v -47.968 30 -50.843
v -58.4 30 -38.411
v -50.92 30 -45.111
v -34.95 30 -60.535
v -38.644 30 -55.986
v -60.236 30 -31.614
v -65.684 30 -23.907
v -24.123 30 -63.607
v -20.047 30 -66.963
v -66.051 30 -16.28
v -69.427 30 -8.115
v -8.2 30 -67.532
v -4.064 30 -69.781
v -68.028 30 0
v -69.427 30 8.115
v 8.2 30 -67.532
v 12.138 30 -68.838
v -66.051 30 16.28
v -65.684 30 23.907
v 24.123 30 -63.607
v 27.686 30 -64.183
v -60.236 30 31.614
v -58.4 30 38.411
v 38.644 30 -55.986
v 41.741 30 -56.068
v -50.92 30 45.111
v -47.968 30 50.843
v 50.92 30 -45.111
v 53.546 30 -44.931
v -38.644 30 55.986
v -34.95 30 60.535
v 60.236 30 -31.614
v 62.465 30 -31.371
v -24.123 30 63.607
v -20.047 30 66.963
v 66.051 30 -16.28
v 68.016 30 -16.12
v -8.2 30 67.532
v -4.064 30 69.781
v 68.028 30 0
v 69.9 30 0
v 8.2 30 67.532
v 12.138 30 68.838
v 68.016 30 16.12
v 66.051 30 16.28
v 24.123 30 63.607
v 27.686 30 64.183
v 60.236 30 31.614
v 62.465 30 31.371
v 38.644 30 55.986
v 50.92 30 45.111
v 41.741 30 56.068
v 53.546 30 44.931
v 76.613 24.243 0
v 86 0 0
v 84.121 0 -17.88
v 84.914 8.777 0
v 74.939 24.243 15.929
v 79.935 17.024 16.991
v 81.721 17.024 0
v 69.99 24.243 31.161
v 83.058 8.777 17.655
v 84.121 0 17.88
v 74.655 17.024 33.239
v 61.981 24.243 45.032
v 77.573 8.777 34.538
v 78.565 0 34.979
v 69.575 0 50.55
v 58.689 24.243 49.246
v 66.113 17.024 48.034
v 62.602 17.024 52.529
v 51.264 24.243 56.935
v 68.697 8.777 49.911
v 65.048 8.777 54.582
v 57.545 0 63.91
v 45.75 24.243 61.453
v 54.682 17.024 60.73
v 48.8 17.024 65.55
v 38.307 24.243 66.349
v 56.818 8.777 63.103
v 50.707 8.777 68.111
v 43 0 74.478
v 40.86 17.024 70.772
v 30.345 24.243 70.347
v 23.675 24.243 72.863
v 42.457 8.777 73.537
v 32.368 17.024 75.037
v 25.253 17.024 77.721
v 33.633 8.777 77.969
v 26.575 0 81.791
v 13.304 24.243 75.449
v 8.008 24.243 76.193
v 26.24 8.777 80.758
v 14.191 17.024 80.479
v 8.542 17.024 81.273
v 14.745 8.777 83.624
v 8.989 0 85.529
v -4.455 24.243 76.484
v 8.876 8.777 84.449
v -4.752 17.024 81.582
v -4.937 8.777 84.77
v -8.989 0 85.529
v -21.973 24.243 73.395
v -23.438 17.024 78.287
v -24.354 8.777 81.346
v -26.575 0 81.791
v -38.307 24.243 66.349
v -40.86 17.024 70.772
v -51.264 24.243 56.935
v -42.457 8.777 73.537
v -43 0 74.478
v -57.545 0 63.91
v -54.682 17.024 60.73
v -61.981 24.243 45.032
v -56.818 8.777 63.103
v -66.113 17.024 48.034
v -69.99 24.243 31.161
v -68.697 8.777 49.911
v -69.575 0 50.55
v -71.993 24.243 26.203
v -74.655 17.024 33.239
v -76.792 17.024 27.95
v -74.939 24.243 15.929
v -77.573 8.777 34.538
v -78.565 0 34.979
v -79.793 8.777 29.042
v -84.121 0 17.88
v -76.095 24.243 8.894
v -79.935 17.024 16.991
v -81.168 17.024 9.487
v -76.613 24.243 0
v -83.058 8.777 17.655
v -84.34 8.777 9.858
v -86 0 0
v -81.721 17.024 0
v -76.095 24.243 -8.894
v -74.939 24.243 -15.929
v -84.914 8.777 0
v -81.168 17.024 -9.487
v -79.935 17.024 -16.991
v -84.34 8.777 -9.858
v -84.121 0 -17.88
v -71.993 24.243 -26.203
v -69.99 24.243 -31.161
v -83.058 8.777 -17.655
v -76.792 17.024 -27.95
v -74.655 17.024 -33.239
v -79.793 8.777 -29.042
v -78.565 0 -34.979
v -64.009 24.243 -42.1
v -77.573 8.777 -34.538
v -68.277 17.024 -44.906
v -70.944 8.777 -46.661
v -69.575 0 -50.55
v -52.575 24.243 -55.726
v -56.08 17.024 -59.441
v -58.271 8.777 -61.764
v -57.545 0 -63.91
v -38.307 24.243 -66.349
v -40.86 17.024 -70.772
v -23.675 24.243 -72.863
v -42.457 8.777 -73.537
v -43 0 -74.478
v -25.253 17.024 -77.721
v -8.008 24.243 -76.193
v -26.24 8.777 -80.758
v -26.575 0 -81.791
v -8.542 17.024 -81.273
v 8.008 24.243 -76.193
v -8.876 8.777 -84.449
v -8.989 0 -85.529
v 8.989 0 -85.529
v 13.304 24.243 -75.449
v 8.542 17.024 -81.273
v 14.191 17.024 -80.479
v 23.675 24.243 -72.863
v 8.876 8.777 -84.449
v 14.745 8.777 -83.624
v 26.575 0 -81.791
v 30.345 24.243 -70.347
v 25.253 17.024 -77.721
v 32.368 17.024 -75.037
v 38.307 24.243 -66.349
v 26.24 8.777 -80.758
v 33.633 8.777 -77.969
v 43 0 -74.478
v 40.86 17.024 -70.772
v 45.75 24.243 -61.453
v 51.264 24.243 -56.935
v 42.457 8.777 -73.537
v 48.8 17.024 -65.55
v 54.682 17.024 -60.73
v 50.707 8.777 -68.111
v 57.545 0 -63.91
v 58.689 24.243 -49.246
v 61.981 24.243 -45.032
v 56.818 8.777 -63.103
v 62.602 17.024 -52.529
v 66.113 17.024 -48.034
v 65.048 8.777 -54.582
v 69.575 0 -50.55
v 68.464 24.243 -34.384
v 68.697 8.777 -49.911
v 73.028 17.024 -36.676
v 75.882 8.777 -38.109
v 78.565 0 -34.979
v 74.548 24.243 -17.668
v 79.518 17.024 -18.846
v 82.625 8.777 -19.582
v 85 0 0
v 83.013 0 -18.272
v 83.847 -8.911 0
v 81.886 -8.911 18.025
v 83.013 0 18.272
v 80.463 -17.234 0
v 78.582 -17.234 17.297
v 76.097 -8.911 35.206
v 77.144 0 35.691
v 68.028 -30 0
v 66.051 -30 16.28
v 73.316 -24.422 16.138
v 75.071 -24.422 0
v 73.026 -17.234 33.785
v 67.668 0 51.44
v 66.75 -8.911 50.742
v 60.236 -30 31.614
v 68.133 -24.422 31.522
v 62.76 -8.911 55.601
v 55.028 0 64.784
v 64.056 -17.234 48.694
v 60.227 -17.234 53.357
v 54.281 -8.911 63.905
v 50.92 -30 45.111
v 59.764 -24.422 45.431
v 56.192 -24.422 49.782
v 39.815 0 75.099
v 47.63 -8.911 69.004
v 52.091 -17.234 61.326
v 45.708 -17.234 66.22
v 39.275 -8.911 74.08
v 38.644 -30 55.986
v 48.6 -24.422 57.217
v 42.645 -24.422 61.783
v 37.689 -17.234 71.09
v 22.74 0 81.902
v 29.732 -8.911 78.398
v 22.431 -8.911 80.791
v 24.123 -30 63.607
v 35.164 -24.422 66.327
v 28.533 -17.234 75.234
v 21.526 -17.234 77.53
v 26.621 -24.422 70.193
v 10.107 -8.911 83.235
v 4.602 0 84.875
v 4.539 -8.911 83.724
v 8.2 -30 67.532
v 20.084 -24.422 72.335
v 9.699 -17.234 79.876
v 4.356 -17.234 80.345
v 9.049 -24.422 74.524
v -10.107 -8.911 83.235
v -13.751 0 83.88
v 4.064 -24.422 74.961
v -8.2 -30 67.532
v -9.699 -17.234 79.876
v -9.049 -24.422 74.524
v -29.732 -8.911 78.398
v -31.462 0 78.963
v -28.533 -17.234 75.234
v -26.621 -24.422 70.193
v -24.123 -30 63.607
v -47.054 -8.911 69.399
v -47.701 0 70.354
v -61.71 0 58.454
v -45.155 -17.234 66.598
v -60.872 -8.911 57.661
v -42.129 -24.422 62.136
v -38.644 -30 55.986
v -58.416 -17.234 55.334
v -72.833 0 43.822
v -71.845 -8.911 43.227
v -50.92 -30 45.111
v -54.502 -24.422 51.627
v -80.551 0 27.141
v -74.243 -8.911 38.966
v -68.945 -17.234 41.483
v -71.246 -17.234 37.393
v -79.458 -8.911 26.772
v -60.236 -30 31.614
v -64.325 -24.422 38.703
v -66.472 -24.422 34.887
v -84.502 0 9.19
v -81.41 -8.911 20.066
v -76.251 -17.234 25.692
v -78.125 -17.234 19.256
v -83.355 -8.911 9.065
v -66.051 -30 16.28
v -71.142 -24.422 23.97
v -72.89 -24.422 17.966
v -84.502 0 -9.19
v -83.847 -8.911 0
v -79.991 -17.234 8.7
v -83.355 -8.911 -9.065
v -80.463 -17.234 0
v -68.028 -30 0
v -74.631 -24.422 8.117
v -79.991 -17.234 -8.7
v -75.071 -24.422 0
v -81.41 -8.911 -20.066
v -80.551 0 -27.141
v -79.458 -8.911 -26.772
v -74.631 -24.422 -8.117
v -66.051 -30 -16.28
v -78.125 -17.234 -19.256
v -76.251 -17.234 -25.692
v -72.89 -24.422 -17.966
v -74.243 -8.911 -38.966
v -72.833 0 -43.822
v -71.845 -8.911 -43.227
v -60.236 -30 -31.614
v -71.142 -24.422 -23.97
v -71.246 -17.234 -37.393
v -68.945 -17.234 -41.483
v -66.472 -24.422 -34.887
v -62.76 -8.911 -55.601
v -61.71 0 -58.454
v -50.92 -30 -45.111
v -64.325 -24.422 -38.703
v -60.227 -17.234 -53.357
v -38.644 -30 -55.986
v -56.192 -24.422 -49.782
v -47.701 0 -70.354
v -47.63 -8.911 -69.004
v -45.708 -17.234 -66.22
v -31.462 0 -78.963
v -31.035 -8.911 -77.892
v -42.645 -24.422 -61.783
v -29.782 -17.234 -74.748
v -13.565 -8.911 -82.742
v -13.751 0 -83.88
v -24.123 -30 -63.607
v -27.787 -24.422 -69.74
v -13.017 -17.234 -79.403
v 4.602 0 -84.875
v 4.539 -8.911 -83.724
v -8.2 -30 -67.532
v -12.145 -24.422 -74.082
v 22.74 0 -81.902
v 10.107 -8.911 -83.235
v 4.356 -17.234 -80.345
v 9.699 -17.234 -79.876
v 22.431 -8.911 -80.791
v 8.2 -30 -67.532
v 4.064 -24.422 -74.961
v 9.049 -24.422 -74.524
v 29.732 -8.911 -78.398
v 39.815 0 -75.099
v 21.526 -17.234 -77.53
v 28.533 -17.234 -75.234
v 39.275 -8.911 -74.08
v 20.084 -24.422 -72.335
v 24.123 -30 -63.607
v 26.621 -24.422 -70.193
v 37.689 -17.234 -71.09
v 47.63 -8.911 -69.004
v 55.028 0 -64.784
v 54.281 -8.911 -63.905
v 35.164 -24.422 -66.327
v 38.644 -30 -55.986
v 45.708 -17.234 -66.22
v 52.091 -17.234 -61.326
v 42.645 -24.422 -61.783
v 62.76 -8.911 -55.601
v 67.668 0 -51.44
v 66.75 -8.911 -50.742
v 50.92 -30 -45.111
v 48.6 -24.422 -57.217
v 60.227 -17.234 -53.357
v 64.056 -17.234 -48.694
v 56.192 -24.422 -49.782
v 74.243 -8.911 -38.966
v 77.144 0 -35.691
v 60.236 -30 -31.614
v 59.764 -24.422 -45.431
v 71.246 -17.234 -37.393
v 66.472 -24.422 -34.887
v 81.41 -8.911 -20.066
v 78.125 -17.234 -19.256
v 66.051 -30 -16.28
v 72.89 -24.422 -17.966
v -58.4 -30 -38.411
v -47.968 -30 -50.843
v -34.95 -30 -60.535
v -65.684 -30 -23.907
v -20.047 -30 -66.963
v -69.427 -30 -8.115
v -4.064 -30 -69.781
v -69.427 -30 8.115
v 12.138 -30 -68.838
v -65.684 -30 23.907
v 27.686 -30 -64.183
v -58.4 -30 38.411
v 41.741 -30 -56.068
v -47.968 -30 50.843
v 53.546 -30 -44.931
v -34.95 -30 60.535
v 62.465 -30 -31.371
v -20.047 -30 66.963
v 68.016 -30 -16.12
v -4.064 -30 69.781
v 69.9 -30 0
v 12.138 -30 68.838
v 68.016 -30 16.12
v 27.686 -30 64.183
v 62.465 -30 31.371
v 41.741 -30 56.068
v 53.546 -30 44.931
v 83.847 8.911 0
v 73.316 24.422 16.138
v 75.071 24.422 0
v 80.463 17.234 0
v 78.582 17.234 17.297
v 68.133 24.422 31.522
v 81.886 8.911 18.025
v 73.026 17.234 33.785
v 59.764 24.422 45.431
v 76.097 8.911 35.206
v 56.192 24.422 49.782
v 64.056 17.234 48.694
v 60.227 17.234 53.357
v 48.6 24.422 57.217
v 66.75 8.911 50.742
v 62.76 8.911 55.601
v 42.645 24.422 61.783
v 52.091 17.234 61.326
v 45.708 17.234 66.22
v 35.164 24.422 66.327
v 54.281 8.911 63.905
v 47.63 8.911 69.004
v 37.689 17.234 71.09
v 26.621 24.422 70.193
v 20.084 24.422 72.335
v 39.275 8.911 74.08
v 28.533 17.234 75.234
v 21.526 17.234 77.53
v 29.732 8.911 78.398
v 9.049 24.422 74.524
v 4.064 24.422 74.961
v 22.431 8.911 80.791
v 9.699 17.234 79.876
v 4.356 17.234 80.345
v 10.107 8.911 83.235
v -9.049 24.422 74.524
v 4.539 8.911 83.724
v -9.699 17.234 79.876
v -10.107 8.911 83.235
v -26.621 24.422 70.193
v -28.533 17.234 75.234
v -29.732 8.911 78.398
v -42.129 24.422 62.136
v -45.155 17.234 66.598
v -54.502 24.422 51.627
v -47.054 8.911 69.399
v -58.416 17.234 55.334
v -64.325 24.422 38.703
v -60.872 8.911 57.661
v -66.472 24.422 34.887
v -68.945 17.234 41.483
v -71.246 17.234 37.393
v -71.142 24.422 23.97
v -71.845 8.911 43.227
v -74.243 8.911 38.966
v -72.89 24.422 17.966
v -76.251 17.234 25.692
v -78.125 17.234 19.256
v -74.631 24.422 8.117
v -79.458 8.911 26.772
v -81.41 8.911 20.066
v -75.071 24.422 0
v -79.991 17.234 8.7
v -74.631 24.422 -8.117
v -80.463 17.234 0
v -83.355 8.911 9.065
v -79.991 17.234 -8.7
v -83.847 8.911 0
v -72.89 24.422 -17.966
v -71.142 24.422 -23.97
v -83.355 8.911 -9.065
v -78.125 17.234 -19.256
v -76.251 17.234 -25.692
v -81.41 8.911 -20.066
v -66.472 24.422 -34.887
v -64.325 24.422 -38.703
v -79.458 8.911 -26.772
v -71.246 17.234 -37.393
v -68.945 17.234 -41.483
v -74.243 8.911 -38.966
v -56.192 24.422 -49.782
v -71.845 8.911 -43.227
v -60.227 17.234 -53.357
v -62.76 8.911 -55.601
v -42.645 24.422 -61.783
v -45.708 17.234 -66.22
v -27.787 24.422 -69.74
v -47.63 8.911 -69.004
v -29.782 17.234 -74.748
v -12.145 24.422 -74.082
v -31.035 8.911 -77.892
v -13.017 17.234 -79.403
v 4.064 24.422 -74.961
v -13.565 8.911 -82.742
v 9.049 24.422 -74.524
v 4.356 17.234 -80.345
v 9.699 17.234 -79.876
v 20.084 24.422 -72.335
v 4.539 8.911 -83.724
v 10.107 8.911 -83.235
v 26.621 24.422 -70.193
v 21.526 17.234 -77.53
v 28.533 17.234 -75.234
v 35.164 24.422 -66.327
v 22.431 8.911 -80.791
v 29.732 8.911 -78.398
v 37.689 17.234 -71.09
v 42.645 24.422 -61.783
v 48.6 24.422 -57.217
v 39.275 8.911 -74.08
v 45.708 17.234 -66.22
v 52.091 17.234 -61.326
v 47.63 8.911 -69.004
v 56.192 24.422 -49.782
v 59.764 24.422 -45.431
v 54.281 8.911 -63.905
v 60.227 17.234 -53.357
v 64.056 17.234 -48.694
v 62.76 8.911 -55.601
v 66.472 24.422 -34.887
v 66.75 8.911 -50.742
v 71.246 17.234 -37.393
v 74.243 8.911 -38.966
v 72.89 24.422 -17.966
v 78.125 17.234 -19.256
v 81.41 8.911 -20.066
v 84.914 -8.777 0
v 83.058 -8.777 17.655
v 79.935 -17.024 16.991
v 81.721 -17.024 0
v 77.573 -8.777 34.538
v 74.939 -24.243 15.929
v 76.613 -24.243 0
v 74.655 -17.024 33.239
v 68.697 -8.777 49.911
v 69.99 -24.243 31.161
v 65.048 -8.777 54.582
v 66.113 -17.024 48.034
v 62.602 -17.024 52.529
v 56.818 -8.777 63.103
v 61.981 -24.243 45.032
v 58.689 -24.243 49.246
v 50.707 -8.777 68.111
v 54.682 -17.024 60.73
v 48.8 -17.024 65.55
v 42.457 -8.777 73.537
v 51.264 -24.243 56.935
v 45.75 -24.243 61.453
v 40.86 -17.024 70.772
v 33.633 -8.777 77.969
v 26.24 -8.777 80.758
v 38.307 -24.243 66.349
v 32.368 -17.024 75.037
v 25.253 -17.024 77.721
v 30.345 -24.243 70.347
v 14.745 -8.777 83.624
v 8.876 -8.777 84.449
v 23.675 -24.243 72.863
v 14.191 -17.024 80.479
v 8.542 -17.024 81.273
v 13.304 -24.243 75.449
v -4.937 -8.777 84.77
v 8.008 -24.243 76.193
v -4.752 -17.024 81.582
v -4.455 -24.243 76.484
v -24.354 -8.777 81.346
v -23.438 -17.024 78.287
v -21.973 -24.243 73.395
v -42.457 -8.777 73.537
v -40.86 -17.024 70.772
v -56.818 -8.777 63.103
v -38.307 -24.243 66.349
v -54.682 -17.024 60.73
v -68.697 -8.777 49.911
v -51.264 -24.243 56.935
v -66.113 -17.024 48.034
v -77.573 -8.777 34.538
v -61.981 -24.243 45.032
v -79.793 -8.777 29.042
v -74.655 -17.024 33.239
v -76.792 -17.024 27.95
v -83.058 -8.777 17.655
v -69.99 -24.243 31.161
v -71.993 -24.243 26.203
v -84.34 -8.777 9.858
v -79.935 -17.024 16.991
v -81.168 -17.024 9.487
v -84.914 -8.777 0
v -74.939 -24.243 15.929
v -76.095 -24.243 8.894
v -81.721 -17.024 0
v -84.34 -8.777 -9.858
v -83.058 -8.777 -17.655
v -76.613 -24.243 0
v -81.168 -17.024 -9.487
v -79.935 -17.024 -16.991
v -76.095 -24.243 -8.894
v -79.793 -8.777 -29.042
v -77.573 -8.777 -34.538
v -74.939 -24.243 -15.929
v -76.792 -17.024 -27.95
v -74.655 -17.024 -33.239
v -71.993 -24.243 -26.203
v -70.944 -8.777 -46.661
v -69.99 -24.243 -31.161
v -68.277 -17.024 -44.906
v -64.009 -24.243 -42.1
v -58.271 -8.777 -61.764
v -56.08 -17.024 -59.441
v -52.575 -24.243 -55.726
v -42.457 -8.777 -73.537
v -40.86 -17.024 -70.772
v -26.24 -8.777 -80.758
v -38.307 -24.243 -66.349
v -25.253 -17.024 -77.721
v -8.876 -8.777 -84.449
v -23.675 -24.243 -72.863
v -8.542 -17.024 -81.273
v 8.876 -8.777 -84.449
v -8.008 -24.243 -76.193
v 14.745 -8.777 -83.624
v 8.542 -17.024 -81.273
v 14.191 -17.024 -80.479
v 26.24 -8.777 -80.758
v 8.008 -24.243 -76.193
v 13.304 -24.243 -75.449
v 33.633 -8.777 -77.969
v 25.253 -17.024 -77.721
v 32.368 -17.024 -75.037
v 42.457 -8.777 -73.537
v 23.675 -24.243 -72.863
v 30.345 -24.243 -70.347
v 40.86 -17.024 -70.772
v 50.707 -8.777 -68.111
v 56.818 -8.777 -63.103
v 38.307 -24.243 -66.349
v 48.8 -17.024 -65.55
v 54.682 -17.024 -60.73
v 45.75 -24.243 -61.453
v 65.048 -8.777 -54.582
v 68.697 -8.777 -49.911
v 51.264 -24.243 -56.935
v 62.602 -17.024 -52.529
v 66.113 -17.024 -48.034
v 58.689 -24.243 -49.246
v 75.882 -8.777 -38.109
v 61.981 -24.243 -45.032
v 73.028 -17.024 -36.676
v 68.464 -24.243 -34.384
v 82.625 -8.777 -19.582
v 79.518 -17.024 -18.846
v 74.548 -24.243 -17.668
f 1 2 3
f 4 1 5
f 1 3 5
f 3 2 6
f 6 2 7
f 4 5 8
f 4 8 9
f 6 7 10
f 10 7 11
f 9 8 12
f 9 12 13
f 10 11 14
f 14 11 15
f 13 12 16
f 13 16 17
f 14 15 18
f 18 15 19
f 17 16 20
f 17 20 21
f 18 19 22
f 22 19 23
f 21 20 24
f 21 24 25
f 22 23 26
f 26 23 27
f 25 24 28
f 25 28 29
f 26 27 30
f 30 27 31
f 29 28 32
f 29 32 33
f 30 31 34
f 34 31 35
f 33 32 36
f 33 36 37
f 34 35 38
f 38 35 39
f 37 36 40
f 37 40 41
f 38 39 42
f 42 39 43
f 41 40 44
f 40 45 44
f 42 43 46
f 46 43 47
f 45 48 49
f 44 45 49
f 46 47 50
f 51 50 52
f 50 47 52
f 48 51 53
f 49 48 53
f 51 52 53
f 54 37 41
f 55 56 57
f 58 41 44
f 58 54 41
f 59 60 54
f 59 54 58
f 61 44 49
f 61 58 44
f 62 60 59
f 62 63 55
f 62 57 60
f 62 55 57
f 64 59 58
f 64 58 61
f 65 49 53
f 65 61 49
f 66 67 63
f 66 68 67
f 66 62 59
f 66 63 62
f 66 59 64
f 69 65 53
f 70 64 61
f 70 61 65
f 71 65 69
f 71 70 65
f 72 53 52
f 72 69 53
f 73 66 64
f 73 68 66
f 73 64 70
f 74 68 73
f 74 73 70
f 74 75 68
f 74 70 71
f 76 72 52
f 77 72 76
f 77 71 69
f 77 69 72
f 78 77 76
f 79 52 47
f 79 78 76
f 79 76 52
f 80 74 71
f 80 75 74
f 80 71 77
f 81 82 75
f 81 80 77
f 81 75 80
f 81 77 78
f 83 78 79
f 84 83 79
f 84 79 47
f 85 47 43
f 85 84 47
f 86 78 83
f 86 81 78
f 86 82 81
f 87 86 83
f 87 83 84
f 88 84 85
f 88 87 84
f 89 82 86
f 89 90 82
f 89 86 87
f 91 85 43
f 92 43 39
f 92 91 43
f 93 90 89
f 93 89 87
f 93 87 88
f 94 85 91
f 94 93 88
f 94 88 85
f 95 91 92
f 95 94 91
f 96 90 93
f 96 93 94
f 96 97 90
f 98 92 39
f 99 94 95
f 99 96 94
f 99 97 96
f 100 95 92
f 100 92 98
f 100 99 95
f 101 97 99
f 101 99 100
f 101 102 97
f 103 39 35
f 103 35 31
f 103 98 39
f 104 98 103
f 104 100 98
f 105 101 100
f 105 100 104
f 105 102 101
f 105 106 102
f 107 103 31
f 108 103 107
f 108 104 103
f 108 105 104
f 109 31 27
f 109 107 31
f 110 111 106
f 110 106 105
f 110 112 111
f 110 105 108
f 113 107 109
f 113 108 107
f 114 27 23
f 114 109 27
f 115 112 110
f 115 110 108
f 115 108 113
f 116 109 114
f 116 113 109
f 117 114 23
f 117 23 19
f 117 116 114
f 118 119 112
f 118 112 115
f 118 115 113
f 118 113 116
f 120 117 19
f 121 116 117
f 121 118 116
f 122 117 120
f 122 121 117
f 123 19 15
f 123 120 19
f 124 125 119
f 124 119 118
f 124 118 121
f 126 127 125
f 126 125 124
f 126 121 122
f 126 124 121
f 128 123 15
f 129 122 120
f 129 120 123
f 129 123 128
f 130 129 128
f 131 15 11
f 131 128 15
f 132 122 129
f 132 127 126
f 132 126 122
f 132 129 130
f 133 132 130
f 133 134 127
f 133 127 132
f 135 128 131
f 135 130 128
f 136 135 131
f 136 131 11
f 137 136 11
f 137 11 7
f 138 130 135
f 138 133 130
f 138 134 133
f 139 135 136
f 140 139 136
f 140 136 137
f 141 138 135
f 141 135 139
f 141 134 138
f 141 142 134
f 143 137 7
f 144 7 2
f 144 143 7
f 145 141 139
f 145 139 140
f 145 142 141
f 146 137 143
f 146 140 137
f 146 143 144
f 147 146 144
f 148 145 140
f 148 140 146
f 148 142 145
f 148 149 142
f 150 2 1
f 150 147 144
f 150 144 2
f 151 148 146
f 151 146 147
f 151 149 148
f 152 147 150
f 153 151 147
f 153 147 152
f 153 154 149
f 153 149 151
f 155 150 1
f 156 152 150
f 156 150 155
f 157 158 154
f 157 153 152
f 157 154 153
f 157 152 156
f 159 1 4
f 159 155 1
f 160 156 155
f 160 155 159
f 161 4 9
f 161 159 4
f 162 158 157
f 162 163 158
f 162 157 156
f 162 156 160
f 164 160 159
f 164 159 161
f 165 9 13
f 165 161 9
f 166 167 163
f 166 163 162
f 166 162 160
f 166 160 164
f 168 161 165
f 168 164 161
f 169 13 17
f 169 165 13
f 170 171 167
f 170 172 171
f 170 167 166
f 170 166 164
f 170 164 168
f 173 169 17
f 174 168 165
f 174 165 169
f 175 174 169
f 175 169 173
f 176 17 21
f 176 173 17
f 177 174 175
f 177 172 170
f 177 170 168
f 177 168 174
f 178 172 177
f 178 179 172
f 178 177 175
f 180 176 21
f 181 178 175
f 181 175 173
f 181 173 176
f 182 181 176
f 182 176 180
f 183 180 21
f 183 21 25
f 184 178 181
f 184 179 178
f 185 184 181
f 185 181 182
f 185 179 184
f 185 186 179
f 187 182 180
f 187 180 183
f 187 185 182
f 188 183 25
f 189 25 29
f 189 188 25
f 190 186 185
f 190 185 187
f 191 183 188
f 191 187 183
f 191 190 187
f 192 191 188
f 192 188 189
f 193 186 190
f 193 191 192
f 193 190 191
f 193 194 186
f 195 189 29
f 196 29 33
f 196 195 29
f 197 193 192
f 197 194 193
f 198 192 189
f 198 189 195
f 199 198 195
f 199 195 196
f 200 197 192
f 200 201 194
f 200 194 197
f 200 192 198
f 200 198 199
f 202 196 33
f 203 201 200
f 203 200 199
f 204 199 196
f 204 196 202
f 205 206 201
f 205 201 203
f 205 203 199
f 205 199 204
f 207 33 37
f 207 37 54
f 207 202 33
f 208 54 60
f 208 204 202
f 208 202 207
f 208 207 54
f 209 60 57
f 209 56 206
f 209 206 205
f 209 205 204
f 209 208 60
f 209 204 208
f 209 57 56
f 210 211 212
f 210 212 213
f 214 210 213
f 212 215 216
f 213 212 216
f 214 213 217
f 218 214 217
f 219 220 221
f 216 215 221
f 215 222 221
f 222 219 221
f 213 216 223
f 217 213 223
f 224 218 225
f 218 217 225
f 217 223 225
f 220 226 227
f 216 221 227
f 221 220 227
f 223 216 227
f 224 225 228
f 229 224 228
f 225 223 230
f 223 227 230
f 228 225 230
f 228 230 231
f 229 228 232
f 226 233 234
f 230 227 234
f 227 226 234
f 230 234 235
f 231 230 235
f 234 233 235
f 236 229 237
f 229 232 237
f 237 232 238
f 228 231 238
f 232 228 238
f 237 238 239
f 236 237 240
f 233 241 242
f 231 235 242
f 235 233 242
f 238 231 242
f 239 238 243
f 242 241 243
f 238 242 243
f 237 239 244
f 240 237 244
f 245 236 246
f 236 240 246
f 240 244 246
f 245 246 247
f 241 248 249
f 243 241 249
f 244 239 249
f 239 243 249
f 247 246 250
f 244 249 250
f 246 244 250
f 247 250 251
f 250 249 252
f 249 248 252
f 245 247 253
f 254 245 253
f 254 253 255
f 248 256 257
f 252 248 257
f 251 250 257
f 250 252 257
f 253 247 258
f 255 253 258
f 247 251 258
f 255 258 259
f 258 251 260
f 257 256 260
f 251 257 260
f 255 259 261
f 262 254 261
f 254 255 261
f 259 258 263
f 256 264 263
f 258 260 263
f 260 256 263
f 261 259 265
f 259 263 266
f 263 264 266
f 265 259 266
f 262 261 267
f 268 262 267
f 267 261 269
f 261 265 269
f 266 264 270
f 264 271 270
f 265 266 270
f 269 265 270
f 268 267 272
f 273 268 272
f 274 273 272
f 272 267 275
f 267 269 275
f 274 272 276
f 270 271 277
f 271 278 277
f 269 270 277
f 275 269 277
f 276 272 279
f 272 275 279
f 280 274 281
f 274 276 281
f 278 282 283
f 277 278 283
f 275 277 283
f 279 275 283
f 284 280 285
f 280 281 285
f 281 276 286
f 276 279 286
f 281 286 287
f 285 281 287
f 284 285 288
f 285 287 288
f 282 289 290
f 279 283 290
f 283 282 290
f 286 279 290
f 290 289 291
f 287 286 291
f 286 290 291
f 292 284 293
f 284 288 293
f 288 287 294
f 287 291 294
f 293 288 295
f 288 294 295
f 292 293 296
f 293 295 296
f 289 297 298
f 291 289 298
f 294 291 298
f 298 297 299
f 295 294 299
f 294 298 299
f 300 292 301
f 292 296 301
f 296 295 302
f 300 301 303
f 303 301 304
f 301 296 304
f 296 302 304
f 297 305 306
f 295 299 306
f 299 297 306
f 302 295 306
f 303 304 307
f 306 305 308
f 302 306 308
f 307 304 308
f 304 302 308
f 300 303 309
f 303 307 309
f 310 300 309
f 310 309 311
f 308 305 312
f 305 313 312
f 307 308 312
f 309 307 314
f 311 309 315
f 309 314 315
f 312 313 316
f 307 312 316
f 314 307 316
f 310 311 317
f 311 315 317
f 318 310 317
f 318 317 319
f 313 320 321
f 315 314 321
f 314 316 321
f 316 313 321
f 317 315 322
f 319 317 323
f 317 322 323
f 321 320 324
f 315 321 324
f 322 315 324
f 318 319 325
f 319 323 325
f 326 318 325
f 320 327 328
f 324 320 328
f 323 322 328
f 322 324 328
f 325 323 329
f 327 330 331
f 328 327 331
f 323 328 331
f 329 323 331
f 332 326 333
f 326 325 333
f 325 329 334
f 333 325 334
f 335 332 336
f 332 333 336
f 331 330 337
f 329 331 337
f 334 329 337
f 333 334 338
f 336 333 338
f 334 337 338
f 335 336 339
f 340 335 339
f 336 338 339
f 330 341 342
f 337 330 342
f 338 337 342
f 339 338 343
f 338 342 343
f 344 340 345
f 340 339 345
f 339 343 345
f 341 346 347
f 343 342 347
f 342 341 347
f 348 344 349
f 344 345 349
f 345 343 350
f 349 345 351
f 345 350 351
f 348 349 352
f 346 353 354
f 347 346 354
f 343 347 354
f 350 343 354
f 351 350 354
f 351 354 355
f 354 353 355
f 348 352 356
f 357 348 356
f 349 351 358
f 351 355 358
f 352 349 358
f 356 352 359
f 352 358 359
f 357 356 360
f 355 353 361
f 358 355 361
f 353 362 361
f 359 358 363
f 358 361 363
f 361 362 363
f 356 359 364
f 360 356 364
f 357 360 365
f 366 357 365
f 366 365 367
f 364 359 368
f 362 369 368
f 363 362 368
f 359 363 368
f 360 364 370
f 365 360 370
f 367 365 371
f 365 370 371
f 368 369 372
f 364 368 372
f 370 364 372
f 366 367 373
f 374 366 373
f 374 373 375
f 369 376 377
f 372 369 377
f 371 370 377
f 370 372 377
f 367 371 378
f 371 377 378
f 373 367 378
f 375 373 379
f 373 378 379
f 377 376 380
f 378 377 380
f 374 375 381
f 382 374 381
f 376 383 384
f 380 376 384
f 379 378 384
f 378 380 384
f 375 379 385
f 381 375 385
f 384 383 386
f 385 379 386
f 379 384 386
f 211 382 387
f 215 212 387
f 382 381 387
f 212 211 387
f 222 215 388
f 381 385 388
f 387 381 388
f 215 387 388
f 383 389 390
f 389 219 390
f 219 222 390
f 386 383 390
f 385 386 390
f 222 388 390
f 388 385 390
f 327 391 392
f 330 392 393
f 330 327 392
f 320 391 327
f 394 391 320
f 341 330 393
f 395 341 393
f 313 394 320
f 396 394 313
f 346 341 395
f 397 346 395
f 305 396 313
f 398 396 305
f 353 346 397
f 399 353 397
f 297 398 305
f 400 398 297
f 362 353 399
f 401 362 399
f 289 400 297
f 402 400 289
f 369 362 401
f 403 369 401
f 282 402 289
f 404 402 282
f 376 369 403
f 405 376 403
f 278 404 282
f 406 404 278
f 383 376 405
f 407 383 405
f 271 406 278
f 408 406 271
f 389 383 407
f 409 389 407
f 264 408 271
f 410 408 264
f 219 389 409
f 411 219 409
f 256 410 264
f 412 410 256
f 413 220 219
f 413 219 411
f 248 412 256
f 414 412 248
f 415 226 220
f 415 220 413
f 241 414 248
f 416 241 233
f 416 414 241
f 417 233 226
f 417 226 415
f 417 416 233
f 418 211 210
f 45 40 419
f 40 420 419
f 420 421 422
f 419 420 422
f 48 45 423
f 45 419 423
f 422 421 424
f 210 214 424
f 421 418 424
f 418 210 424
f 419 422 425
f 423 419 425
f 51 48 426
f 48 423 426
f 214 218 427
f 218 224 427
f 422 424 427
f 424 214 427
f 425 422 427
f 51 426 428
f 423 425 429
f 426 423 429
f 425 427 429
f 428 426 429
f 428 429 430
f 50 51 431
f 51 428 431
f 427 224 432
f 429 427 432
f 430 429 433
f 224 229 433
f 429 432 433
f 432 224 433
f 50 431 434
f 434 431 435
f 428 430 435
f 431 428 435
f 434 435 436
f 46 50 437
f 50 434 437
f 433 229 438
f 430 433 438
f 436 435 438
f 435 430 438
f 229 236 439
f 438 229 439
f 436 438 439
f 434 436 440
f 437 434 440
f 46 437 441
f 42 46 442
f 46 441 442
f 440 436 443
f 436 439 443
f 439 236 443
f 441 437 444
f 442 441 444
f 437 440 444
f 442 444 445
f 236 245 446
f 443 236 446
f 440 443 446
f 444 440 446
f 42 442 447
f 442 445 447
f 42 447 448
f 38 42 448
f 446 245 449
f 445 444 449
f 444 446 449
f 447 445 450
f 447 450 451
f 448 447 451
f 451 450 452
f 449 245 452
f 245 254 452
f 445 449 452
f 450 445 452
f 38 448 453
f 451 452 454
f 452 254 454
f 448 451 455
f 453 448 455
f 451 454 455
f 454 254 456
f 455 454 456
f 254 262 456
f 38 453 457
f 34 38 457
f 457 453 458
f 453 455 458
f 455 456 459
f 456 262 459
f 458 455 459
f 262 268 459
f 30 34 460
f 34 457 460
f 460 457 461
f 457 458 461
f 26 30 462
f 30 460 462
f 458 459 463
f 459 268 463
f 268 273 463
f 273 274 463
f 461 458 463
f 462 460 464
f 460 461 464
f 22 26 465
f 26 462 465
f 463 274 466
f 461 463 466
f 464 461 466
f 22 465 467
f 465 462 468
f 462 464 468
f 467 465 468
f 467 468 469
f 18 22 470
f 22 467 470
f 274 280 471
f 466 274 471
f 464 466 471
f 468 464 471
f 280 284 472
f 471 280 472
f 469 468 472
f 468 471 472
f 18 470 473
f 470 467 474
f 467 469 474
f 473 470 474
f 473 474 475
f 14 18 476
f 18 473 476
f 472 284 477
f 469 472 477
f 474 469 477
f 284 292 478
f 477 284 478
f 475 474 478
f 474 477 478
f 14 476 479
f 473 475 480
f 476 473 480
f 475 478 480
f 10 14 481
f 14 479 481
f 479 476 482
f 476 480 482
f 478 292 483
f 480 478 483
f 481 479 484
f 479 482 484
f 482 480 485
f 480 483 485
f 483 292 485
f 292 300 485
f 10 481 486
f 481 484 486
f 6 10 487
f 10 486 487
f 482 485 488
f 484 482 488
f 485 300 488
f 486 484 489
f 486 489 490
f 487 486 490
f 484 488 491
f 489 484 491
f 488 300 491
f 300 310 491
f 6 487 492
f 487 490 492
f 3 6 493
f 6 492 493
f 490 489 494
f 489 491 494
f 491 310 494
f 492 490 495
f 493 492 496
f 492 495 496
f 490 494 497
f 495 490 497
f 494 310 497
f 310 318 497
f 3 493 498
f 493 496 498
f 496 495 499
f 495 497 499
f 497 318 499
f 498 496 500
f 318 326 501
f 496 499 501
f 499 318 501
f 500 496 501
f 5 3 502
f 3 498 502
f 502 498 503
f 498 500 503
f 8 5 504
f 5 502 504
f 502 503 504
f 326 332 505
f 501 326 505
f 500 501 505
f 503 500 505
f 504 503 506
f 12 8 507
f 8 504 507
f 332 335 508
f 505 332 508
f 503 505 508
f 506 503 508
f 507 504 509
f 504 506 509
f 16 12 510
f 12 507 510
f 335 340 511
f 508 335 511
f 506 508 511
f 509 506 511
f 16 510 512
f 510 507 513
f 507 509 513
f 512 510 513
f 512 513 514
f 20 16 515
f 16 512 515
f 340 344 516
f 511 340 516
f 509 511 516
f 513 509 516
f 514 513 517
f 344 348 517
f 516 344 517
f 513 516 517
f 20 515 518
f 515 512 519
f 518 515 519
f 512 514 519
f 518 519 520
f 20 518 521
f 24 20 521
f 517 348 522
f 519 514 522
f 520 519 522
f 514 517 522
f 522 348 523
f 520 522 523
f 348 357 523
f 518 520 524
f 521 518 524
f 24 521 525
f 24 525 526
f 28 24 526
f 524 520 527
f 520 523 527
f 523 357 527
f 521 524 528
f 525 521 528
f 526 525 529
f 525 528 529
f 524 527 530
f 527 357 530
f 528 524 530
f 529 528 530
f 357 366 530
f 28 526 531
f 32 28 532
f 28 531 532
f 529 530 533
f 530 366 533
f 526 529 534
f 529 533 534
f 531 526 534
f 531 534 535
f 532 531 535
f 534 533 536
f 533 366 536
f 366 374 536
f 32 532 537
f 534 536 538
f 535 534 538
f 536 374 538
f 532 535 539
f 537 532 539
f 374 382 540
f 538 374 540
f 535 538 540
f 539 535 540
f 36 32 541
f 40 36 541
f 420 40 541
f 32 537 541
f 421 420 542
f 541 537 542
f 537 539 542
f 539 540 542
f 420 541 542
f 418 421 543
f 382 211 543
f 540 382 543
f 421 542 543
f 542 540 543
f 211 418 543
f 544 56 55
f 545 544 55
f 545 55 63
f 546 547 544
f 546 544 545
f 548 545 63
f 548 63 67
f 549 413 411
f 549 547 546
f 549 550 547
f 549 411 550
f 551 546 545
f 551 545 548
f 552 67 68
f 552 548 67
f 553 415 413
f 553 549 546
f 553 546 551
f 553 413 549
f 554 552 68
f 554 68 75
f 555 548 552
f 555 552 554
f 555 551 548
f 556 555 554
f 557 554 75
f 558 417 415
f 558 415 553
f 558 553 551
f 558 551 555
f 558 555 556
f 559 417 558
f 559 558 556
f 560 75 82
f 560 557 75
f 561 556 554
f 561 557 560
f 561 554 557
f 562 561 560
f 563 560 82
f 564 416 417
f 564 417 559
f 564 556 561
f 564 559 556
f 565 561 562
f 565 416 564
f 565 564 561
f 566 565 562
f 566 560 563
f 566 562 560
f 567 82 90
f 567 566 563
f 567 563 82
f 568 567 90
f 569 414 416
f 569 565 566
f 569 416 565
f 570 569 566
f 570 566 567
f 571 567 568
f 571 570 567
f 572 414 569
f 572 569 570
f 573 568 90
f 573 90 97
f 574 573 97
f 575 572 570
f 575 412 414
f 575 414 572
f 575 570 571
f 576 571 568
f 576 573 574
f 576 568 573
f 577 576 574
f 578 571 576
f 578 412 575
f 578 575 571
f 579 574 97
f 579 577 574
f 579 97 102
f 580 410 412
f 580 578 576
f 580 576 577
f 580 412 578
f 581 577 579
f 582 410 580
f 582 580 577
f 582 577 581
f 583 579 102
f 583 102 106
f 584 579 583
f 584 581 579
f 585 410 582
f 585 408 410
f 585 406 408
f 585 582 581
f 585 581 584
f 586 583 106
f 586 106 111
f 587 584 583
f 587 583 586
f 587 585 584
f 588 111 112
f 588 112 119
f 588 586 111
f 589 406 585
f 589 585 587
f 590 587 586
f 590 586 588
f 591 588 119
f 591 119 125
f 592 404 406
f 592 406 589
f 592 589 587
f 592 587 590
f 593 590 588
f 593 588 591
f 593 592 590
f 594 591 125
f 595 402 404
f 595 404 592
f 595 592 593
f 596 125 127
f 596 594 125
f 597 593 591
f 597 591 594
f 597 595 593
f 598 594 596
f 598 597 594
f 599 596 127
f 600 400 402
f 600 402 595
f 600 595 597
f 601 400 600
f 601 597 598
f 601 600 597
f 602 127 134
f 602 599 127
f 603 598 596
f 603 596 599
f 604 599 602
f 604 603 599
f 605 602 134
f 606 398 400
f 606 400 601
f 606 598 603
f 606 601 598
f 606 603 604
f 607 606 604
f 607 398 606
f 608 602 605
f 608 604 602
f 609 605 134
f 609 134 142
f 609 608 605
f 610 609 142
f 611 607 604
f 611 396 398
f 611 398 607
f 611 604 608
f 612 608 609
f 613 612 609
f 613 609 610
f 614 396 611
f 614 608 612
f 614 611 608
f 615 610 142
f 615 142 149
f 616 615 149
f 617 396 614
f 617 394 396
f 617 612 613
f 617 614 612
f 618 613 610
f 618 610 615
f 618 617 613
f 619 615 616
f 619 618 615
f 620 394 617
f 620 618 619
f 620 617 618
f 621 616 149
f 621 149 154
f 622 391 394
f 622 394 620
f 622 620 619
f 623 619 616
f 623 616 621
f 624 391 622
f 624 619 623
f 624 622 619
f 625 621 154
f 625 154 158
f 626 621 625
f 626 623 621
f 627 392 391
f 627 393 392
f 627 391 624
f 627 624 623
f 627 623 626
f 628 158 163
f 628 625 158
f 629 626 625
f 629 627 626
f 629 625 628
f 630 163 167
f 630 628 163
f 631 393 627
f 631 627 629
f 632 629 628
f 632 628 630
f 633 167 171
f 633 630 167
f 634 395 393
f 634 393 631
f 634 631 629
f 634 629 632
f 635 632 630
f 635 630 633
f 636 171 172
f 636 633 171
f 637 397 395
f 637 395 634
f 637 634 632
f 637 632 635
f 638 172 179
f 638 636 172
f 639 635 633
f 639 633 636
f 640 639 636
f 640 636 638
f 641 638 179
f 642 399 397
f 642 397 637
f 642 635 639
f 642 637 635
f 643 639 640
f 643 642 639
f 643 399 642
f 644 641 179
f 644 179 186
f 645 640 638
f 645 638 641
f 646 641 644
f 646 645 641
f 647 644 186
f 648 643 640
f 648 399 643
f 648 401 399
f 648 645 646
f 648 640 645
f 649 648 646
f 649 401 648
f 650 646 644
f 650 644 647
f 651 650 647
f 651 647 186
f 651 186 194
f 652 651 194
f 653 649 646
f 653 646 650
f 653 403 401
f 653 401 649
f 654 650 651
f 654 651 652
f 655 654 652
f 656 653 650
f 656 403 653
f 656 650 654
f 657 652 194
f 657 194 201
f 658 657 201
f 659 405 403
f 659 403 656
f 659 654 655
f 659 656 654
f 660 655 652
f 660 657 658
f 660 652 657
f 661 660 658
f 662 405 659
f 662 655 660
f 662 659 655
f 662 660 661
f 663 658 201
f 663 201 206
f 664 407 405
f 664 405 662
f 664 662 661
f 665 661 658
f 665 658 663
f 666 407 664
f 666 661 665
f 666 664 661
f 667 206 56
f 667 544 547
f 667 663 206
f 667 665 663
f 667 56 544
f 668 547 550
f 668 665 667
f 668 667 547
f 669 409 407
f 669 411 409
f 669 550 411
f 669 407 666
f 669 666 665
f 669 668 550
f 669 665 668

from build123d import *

# Parameters (mm, degrees)
CYLINDER030_R          = 100
CYLINDER030_DEPTH      = 86
CYLINDER030_ROLL_ANGLE = 90
CYLINDER_R             = 50
CYLINDER_DEPTH         = 70
CYLINDER_ROLL_ANGLE    = 90
TORUS_R                = 35
TORUS_ROLL_ANGLE       = 90
CYLINDER029_R          = 60
CYLINDER029_DEPTH      = 86
CYLINDER029_ROLL_ANGLE = 90
TORUS001_R             = 36
TORUS001_ROLL_ANGLE    = 90


with BuildPart() as cilindro030:
    # Cylinder030 → Cylinder030 (new body)
    with BuildSketch(Plane.XY):
        Circle(CYLINDER030_R)
    extrude(amount=CYLINDER030_DEPTH)


with BuildPart() as cilindro030_1:
    # Cylinder030 roll: moved
    add(cilindro030.part.rotate(Axis((0, 0, 0), (1, 0, 0)), CYLINDER030_ROLL_ANGLE))


with BuildPart() as cilindro030_2:
    # Cylinder030 placement: moved
    add(cilindro030_1.part.moved(Location((0, -30, 0))))


with BuildPart() as fusion021:
    # Part__Mirroring005: instance of Cilindro030
    add(cilindro030_2.part.mirror(Plane(origin=(0, 0, 0), x_dir=(1, 0, 0), z_dir=(0, 1, 0))))

    # Fusion021: union Cilindro030
    add(cilindro030_2.part)


with BuildPart() as cilindro:
    # Cylinder → Cylinder (new body)
    with BuildSketch(Plane.XY):
        Circle(CYLINDER_R)
    extrude(amount=CYLINDER_DEPTH)


with BuildPart() as cilindro_1:
    # Cylinder roll: moved
    add(cilindro.part.rotate(Axis((0, 0, 0), (1, 0, 0)), CYLINDER_ROLL_ANGLE))


with BuildPart() as cilindro_2:
    # Cylinder placement: moved
    add(cilindro_1.part.moved(Location((0, 35, 0))))


with BuildPart() as clone_of_fusion:
    # Torus → Torus (revolve)
    with BuildSketch(Plane.XZ):
        with Locations((50, 0)):
            Circle(TORUS_R)
    revolve(axis=Axis((0, 0, 0), (0, 0, 1)))


with BuildPart() as clone_of_fusion_1:
    # Torus roll: moved
    add(clone_of_fusion.part.rotate(Axis((0, 0, 0), (1, 0, 0)), TORUS_ROLL_ANGLE))


with BuildPart() as clone_of_fusion_2:
    # Torus placement: moved
    add(clone_of_fusion_1.part)

    # Fusion: union Cilindro
    add(cilindro_2.part)


with BuildPart() as cilindro029:
    # Cylinder029 → Cylinder029 (new body)
    with BuildSketch(Plane.XY):
        Circle(CYLINDER029_R)
    extrude(amount=CYLINDER029_DEPTH)


with BuildPart() as cilindro029_1:
    # Cylinder029 roll: moved
    add(cilindro029.part.rotate(Axis((0, 0, 0), (1, 0, 0)), CYLINDER029_ROLL_ANGLE))


with BuildPart() as cilindro029_2:
    # Cylinder029 placement: moved
    add(cilindro029_1.part.moved(Location((0, 42, 0))))


with BuildPart() as cut030:
    # Torus001 → Torus001 (revolve)
    with BuildSketch(Plane.XZ):
        with Locations((50, 0)):
            Circle(TORUS001_R)
    revolve(axis=Axis((0, 0, 0), (0, 0, 1)))


with BuildPart() as cut030_1:
    # Torus001 roll: moved
    add(cut030.part.rotate(Axis((0, 0, 0), (1, 0, 0)), TORUS001_ROLL_ANGLE))


with BuildPart() as cut030_2:
    # Torus001 placement: moved
    add(cut030_1.part)

    # Cut028: cut Cilindro029
    add(cilindro029_2.part, mode=Mode.SUBTRACT)

    # Cut029: cut Clone of Fusion
    add(clone_of_fusion_2.part, mode=Mode.SUBTRACT)

    # Cut030: cut Fusion021
    add(fusion021.part, mode=Mode.SUBTRACT)


solid = cut030_2.part
